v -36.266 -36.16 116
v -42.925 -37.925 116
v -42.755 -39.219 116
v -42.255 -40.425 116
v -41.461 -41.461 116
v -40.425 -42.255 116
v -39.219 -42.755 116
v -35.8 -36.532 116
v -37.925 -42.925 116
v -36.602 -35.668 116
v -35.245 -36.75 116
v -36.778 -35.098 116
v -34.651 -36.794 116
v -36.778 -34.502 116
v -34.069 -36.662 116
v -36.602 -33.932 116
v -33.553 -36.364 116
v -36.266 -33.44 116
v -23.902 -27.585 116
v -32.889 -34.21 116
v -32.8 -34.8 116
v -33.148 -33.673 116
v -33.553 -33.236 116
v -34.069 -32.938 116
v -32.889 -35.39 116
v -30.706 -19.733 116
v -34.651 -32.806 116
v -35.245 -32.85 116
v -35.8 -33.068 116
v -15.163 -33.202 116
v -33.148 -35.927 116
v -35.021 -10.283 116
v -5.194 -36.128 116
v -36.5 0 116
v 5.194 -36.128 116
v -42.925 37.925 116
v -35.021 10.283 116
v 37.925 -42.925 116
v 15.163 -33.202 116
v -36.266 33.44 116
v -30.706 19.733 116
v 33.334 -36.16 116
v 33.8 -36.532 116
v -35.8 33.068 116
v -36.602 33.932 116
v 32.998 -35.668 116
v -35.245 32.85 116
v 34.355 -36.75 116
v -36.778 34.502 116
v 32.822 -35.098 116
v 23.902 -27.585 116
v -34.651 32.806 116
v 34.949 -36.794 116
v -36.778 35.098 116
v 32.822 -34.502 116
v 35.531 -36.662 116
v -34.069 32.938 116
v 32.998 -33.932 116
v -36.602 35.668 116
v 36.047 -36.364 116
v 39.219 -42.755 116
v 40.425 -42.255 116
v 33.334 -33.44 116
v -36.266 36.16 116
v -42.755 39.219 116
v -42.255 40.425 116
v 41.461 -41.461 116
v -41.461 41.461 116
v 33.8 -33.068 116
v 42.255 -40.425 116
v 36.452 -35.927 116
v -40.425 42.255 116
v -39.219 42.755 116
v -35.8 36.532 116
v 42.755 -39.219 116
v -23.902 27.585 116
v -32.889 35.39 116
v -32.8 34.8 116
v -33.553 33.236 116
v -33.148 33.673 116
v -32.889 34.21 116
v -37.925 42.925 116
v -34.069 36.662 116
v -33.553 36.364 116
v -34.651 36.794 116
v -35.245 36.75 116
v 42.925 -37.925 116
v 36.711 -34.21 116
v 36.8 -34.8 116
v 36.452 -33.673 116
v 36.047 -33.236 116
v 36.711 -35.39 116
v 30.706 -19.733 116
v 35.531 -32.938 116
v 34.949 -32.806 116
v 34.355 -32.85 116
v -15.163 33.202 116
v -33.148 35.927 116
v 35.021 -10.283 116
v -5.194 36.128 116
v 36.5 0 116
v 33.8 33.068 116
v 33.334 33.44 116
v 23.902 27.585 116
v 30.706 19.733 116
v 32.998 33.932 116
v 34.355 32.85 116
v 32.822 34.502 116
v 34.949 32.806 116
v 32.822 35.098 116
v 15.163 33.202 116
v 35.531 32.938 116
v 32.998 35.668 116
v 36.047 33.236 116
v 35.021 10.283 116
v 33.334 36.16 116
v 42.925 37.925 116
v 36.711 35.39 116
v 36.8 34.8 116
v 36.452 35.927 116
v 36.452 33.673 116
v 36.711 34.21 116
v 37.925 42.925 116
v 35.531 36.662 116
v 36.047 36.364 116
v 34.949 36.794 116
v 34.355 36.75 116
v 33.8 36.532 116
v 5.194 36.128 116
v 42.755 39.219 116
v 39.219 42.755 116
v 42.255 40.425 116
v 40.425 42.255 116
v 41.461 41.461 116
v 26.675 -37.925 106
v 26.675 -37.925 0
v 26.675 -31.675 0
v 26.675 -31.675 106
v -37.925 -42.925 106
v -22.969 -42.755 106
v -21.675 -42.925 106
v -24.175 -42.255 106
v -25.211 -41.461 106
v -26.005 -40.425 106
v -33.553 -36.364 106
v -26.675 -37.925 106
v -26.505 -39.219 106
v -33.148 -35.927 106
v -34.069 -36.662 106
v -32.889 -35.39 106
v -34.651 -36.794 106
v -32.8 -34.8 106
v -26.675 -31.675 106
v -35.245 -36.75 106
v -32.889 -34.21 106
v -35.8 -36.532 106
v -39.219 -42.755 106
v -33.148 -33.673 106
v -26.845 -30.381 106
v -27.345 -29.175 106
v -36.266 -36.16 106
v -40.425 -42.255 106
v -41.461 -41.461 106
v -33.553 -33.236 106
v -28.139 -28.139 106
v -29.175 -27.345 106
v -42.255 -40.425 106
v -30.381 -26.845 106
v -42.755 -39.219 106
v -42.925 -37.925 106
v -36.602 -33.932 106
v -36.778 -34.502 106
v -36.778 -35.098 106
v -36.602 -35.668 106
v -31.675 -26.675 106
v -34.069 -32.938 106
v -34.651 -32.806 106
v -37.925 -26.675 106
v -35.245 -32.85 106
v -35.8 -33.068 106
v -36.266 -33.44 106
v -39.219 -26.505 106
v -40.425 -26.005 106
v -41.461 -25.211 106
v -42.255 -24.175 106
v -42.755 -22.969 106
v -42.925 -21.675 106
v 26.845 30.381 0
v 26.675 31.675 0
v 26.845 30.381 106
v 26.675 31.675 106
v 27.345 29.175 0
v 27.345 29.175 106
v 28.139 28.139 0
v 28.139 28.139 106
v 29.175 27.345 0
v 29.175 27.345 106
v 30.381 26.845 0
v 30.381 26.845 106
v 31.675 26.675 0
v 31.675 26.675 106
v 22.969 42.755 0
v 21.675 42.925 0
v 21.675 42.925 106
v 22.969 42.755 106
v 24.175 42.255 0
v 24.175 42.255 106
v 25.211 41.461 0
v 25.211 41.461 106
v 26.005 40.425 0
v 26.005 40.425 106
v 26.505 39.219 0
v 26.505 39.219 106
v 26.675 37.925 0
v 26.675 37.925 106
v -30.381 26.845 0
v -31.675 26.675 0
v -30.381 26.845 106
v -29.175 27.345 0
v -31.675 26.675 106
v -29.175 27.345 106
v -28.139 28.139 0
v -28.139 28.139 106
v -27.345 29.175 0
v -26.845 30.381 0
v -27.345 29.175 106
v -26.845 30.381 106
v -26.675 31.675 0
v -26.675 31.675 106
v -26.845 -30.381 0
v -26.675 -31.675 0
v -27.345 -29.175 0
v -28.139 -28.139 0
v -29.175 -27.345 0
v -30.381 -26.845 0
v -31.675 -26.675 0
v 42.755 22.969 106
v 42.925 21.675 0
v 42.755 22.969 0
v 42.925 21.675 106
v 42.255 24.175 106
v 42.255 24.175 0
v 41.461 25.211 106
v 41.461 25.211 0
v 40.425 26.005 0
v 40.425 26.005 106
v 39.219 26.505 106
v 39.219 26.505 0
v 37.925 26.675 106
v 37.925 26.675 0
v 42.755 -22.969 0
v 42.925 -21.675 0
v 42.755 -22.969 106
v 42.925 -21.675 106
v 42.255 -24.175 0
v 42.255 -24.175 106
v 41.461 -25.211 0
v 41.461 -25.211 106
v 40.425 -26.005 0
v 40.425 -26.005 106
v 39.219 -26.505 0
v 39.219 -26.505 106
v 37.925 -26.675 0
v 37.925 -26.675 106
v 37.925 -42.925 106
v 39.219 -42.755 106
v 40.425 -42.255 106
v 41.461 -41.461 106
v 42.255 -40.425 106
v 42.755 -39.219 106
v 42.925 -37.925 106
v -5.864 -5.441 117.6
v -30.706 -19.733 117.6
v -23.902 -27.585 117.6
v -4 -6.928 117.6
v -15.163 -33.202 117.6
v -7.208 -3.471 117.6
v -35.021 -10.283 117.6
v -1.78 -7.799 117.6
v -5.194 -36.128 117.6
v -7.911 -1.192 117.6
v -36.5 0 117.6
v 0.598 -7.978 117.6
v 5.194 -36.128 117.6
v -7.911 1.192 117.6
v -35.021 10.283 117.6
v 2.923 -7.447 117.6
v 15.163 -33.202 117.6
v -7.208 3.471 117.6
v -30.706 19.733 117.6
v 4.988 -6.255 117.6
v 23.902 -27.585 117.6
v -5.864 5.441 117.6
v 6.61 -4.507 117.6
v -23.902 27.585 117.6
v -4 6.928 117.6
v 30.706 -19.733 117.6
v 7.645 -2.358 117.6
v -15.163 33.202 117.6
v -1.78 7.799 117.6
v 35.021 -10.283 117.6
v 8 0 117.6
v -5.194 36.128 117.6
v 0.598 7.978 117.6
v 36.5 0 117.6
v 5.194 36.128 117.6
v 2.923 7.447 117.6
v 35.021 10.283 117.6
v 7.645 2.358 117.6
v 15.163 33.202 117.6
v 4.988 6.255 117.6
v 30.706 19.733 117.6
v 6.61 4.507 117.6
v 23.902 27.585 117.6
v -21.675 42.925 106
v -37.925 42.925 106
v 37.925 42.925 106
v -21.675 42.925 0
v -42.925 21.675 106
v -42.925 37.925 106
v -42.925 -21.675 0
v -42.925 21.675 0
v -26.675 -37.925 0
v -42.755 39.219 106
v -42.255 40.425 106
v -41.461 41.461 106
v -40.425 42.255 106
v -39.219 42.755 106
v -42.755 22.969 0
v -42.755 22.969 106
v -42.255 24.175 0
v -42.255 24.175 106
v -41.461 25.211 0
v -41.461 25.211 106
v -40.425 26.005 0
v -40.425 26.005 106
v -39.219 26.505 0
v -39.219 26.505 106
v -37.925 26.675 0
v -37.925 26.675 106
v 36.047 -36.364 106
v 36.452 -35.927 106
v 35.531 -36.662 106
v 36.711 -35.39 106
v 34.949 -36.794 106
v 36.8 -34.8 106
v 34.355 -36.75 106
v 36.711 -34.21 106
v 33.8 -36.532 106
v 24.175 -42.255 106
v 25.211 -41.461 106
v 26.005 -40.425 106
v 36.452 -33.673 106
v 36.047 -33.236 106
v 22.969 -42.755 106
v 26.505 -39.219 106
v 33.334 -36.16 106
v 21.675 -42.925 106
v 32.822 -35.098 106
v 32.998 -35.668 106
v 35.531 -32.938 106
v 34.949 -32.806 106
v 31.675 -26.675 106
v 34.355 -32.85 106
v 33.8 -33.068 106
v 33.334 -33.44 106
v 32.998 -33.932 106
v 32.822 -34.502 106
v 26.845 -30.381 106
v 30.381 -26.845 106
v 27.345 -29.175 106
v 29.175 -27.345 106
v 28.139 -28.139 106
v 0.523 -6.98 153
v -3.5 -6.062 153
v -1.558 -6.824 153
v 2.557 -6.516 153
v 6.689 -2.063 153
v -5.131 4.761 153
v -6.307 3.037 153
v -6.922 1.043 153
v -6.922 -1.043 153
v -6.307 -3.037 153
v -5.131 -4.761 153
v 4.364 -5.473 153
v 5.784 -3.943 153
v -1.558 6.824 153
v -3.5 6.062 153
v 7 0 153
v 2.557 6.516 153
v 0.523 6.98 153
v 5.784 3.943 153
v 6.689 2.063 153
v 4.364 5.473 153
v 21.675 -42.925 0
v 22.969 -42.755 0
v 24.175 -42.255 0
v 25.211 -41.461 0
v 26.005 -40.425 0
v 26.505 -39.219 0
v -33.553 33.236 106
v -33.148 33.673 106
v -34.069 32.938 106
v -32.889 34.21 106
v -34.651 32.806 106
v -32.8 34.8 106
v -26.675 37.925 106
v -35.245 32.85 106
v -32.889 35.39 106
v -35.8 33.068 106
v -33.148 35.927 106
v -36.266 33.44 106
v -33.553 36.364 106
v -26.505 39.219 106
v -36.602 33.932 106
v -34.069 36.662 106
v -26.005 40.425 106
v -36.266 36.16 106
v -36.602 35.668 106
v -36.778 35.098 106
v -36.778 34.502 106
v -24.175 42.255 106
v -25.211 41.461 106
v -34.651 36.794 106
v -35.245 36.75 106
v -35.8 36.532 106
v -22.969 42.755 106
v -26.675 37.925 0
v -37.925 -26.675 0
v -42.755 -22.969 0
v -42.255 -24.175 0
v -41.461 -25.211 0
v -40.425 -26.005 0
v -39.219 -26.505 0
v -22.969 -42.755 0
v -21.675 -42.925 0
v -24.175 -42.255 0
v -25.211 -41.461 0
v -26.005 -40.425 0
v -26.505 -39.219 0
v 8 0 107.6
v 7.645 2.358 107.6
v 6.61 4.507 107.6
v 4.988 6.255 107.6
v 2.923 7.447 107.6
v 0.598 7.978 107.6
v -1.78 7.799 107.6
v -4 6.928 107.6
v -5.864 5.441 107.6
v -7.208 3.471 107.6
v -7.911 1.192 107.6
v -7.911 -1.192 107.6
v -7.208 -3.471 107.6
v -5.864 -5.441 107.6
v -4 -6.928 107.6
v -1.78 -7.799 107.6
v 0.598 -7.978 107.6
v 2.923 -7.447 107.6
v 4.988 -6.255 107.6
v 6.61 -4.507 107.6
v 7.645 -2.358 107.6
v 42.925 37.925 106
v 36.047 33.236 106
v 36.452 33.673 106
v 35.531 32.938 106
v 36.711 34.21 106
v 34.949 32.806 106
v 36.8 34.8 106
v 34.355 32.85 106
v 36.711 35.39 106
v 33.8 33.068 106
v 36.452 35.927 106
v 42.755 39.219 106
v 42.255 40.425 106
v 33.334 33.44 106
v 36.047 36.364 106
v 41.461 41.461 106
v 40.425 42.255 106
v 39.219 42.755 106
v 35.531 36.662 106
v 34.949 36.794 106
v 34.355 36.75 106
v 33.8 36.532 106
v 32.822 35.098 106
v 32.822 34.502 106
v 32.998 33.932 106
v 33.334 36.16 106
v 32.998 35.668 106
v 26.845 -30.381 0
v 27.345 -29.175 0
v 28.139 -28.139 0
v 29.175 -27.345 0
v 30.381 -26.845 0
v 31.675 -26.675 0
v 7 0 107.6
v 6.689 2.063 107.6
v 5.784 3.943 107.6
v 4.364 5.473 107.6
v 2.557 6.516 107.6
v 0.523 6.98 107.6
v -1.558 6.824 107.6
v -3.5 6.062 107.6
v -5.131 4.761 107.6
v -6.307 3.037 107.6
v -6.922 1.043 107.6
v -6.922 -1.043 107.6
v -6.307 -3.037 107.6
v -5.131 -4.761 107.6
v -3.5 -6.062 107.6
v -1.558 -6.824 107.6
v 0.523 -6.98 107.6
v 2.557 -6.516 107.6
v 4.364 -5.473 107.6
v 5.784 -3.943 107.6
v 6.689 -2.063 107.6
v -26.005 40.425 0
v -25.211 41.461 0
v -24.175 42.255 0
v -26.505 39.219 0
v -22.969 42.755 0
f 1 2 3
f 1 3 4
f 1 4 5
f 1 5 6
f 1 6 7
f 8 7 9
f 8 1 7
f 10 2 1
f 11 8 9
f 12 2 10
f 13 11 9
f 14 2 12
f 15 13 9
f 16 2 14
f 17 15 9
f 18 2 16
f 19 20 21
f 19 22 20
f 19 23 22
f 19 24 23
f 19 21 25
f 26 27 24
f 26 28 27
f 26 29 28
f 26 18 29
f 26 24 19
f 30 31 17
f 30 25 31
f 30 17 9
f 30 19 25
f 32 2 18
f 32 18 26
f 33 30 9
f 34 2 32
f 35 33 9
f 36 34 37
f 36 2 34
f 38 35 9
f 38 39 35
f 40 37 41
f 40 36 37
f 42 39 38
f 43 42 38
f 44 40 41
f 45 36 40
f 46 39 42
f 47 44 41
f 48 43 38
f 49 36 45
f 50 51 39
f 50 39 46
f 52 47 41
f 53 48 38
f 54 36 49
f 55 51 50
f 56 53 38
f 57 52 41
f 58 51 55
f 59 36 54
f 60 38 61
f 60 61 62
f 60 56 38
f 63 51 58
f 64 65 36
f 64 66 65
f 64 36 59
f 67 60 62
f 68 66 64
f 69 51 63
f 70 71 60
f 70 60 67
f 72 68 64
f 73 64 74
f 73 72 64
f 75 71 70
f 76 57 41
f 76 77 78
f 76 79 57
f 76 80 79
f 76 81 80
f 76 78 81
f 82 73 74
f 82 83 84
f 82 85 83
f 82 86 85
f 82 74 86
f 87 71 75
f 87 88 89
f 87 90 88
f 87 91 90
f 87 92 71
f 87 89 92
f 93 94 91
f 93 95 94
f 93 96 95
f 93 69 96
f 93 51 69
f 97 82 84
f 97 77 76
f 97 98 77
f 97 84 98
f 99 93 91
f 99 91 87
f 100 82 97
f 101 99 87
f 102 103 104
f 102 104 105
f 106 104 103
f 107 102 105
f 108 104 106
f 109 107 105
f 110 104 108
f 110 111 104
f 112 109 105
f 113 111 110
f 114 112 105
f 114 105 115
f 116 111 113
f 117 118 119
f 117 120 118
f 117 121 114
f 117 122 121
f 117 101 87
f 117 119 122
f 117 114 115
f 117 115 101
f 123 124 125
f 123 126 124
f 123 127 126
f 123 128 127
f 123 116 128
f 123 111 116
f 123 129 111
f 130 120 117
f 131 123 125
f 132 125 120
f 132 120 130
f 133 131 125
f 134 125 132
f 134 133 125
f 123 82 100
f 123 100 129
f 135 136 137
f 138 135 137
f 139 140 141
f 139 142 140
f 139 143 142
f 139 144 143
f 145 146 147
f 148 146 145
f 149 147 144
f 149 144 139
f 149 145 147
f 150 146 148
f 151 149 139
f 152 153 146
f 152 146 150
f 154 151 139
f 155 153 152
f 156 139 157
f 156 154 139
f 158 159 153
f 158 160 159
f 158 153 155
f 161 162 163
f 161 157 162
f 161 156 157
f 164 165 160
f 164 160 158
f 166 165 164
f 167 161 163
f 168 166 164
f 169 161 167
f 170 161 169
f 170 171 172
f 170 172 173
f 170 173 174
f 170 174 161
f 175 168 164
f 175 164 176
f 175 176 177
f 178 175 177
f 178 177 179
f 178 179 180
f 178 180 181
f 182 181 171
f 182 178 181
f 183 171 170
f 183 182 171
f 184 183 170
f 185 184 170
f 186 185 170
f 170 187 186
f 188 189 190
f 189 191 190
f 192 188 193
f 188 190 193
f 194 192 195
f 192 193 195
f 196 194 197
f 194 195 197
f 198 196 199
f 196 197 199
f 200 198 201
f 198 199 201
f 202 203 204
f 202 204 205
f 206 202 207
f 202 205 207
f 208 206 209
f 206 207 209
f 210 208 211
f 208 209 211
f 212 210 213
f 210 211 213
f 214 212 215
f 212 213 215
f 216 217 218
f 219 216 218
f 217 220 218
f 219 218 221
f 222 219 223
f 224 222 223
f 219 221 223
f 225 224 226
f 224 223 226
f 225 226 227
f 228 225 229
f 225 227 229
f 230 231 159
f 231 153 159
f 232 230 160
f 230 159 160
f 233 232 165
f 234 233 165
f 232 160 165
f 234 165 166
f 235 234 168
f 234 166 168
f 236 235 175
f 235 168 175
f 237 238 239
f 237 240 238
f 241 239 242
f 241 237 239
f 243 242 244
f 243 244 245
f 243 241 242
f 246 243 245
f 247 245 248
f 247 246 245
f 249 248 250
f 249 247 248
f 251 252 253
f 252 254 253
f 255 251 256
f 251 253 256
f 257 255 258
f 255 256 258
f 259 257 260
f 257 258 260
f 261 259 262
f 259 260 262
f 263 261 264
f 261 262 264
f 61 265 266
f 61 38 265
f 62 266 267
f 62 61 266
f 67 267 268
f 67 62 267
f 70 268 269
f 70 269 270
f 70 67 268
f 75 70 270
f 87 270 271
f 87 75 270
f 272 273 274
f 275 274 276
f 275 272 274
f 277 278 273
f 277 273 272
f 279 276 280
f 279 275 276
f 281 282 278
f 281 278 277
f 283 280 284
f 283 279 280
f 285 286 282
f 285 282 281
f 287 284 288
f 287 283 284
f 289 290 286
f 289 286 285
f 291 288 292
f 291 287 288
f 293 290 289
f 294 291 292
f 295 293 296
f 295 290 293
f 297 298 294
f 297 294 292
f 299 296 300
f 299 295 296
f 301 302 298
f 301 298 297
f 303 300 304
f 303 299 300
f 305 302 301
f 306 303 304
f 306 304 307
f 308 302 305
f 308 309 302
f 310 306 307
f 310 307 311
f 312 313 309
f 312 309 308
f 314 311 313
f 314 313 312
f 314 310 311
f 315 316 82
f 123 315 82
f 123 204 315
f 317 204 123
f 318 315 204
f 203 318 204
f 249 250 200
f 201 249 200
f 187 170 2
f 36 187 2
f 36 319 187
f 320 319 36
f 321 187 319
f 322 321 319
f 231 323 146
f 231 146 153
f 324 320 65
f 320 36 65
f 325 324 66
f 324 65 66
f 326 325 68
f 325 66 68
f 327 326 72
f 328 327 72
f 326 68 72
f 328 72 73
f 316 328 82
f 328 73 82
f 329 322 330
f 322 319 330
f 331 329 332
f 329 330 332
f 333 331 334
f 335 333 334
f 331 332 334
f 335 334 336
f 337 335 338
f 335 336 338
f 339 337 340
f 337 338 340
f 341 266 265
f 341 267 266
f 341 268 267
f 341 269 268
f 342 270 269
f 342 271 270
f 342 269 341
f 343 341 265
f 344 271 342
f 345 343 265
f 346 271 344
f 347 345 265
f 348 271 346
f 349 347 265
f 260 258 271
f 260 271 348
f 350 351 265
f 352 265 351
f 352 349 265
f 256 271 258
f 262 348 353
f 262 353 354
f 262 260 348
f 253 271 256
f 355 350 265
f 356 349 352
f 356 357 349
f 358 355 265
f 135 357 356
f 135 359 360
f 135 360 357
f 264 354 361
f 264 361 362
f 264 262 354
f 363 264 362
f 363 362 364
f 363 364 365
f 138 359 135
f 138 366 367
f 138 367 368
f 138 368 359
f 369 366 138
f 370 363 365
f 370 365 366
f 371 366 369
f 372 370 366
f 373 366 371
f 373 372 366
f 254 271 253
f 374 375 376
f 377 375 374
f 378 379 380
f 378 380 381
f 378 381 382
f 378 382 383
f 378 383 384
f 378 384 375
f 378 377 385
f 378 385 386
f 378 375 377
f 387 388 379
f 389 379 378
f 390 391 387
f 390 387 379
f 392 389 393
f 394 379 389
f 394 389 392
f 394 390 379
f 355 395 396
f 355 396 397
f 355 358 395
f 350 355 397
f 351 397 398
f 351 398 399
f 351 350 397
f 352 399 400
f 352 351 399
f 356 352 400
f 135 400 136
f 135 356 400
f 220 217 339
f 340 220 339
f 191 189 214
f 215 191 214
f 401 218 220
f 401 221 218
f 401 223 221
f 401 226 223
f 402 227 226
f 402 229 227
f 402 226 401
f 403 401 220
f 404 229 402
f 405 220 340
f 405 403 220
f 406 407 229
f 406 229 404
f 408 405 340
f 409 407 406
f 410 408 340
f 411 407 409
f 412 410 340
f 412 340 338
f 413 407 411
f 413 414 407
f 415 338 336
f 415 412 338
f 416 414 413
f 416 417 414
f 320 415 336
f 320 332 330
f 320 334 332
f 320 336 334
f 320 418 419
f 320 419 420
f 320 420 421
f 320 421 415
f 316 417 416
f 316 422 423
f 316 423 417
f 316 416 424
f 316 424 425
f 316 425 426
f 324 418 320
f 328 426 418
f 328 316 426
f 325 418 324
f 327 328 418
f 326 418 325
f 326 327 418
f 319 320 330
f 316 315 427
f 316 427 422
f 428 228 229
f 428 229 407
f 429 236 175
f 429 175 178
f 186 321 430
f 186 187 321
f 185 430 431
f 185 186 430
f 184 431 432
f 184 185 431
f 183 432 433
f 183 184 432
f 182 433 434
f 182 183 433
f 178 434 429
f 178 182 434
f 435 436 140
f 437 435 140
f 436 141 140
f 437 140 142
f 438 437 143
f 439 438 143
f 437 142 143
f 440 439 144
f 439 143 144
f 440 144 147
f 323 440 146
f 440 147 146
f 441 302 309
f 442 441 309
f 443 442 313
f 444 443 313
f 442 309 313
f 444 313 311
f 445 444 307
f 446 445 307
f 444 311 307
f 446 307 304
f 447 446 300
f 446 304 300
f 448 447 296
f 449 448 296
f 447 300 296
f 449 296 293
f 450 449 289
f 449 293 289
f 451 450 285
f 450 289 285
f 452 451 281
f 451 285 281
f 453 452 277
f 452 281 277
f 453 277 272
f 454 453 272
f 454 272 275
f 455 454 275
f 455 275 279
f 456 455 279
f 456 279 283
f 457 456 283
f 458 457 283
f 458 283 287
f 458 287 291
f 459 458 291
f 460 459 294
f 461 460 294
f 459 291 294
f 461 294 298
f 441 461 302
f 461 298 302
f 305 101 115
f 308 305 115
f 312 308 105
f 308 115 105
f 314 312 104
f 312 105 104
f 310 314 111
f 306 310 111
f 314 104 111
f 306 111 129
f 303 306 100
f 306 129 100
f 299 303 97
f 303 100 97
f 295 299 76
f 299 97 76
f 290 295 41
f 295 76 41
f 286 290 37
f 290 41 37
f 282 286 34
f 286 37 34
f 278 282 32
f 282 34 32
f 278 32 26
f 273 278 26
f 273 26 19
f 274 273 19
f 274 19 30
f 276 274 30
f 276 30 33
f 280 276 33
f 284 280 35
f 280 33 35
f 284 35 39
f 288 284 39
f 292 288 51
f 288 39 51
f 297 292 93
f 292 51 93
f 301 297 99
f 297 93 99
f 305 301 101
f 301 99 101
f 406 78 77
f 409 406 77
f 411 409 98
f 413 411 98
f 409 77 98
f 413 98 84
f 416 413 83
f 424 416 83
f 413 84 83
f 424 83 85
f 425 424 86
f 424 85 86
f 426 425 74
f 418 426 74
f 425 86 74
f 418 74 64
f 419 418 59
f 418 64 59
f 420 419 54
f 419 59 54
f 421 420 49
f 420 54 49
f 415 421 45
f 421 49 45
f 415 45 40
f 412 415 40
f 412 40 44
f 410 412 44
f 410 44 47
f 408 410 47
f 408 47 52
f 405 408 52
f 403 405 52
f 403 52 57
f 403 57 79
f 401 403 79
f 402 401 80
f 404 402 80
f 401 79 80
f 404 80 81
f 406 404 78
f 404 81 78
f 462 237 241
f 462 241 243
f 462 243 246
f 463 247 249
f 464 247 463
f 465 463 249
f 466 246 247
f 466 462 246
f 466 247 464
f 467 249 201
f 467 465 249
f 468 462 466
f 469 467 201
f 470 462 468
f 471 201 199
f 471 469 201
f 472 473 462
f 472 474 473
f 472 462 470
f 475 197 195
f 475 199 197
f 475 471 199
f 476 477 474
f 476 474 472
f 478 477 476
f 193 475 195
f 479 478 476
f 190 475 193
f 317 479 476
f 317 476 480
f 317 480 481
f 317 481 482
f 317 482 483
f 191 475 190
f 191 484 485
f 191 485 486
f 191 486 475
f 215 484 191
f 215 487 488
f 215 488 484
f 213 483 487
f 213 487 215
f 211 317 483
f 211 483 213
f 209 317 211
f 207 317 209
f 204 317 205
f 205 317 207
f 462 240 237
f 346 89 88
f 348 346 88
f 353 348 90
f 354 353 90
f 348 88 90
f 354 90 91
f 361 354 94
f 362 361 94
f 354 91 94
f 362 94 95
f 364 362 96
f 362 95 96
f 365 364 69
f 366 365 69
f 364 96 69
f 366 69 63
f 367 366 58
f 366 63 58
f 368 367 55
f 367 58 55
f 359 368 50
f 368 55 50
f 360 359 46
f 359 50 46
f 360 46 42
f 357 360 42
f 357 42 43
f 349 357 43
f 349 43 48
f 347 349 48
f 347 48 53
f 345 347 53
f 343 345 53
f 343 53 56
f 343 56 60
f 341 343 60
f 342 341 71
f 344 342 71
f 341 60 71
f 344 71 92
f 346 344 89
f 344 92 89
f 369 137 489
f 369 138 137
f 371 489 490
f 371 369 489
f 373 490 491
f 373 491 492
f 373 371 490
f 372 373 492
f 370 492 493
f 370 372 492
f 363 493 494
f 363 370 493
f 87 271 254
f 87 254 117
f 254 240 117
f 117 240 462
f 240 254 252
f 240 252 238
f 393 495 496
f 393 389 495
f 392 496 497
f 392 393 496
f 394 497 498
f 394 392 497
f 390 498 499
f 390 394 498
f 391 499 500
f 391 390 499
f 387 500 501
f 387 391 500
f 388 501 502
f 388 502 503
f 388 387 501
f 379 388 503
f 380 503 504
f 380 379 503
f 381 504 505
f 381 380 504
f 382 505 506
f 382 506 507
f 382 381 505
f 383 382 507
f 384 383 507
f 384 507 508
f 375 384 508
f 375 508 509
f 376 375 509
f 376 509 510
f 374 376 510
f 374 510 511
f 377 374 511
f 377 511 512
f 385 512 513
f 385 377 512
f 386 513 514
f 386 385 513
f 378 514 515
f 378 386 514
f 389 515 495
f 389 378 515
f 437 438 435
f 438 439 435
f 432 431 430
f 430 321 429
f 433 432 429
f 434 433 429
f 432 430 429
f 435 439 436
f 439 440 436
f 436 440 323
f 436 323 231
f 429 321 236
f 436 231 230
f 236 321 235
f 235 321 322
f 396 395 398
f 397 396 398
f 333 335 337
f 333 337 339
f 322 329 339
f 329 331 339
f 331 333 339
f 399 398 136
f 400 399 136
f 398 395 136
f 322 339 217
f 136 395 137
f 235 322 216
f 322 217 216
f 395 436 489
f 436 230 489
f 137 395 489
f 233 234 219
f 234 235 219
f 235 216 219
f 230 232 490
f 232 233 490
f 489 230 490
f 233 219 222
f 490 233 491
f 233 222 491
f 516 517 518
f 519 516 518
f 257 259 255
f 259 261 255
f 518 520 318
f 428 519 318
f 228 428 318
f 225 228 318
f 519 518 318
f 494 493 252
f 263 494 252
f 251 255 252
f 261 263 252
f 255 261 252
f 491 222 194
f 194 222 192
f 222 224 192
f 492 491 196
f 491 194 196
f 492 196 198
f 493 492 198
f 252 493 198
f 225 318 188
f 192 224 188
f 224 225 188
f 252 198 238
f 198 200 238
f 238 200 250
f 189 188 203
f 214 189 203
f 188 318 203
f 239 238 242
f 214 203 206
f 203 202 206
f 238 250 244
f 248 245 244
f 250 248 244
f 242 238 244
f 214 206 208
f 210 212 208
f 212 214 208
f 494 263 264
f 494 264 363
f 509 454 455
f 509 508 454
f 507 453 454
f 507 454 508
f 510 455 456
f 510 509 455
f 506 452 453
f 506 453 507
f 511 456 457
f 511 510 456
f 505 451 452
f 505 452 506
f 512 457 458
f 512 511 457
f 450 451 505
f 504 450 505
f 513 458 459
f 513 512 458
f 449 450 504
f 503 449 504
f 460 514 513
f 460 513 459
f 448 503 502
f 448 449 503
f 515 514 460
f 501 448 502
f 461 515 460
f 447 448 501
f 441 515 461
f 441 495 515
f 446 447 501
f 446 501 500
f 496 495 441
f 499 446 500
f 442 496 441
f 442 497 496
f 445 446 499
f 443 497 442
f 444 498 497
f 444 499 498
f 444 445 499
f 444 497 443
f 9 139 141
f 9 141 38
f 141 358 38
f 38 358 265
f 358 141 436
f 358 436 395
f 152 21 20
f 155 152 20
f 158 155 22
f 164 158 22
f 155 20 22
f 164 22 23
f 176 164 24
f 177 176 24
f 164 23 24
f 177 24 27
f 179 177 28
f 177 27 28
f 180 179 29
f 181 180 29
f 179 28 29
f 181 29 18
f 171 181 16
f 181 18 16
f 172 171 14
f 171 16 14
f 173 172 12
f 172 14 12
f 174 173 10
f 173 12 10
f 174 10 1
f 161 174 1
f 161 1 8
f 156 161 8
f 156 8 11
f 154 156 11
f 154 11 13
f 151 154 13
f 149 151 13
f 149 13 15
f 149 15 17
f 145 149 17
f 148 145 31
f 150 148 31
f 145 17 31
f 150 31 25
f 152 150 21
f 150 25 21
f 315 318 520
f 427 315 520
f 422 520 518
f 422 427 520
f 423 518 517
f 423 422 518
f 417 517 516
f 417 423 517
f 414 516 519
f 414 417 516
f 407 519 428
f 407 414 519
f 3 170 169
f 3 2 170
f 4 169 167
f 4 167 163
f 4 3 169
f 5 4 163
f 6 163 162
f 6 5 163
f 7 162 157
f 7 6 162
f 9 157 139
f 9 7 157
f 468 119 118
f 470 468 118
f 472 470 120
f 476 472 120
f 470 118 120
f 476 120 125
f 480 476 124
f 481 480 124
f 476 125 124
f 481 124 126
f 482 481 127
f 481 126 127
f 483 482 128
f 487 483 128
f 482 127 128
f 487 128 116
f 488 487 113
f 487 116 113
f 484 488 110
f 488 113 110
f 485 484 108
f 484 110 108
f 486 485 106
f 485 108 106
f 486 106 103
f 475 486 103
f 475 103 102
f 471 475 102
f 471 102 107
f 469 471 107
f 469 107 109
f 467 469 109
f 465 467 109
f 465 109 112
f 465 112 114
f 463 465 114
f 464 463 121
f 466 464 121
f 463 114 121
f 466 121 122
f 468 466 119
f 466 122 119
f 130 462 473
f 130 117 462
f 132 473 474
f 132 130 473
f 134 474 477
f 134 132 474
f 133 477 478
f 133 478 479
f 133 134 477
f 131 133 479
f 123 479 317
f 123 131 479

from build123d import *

# Parameters (mm, degrees)
SZKIC1_W                    = 85.85
SZKIC1_H                    = 85.85
DODANIE_WYCI_GNI_CIE2_DEPTH = 116
SZKIC3_R                    = 36.5
DODANIE_WYCI_GNI_CIE3_DEPTH = 1.6
SZKIC5_W                    = 16.25
SZKIC5_H                    = 16.25
WYTNIJ_WYCI_GNI_CIE1_DEPTH  = 106
SZYK_LINIOWY1_COUNT         = 2
SZYK_LINIOWY1_PITCH         = 69.6
SZYK_LINIOWY1_COUNT_DIR2    = 2
SZYK_LINIOWY1_PITCH_DIR2    = 69.6
SZKIC6_R                    = 2
WYTNIJ_WYCI_GNI_CIE2_DEPTH  = 10
SZYK_LINIOWY2_COUNT         = 2
SZYK_LINIOWY2_PITCH         = 69.6
SZYK_LINIOWY2_COUNT_DIR2    = 2
SZYK_LINIOWY2_PITCH_DIR2    = 69.6
SZKIC7_R                    = 7
DODANIE_WYCI_GNI_CIE4_DEPTH = 35.4
SZKIC8_R                    = 8
SZKIC8_R_2                  = 7
WYTNIJ_WYCI_GNI_CIE5_DEPTH  = 10
ZAOKR_GLENIE1_R             = 5
ZAOKR_GLENIE2_R             = 5
ZAOKR_GLENIE3_R             = 5


with BuildPart() as part:
    # Szkic1 → Dodanie-wyciągnięcie2 (new body)
    with BuildSketch(Plane.XY):
        Rectangle(SZKIC1_W, SZKIC1_H)
    extrude(amount=DODANIE_WYCI_GNI_CIE2_DEPTH)

    # Szkic3 → Dodanie-wyciągnięcie3 (add)
    with BuildSketch(Plane.XY.offset(116)):
        Circle(SZKIC3_R)
    extrude(amount=DODANIE_WYCI_GNI_CIE3_DEPTH)

    # Szkic5 → Wytnij-wyciągnięcie1 (cut)
    with BuildSketch(Plane(origin=(0, 0, 0), x_dir=(-1, 0, 0), z_dir=(0, 0, -1))):
        with Locations((-34.8, 34.8)):
            Rectangle(SZKIC5_W, SZKIC5_H)
    wytnij_wyci_gni_cie1 = extrude(amount=-WYTNIJ_WYCI_GNI_CIE1_DEPTH, mode=Mode.SUBTRACT)

    # Szyk liniowy1: Wytnij-wyci_gni_cie1 2 × 2
    with Locations(*[(-i * SZYK_LINIOWY1_PITCH, -j * SZYK_LINIOWY1_PITCH_DIR2, 0) for i in range(SZYK_LINIOWY1_COUNT) for j in range(SZYK_LINIOWY1_COUNT_DIR2) if (i, j) != (0, 0)]):
        add(wytnij_wyci_gni_cie1, mode=Mode.SUBTRACT)

    # Szkic6 → Wytnij-wyciągnięcie2 (cut)
    with BuildSketch(Plane.XY.offset(116)):
        with Locations((-34.8, 34.8)):
            Circle(SZKIC6_R)
    wytnij_wyci_gni_cie2 = extrude(amount=-WYTNIJ_WYCI_GNI_CIE2_DEPTH, mode=Mode.SUBTRACT)

    # Szyk liniowy2: Wytnij-wyci_gni_cie2 2 × 2
    with Locations(*[(i * SZYK_LINIOWY2_PITCH, -j * SZYK_LINIOWY2_PITCH_DIR2, 0) for i in range(SZYK_LINIOWY2_COUNT) for j in range(SZYK_LINIOWY2_COUNT_DIR2) if (i, j) != (0, 0)]):
        add(wytnij_wyci_gni_cie2, mode=Mode.SUBTRACT)

    # Szkic7 → Dodanie-wyciągnięcie4 (add)
    with BuildSketch(Plane.XY.offset(117.6)):
        Circle(SZKIC7_R)
    extrude(amount=DODANIE_WYCI_GNI_CIE4_DEPTH)

    # Szkic8 → Wytnij-wyciągnięcie5 (cut)
    with BuildSketch(Plane.XY.offset(117.6)):
        Circle(SZKIC8_R)
        Circle(SZKIC8_R_2, mode=Mode.SUBTRACT)
    extrude(amount=-WYTNIJ_WYCI_GNI_CIE5_DEPTH, mode=Mode.SUBTRACT)

    # Zaokrąglenie1
    zaokr_glenie1_edges = [part.edges().sort_by_distance(p)[0] for p in [
        (42.925, -42.925, 111),
        (-42.925, -42.925, 111),
        (-42.925, 42.925, 111),
        (42.925, 42.925, 111),
    ]]
    fillet(zaokr_glenie1_edges, radius=ZAOKR_GLENIE1_R)

    # Zaokrąglenie2
    zaokr_glenie2_edges = [part.edges().sort_by_distance(p)[0] for p in [
        (42.925, 26.675, 53),
        (26.675, 42.925, 53),
        (42.925, -26.675, 53),
        (26.675, -42.925, 53),
        (-26.675, 42.925, 53),
        (-42.925, 26.675, 53),
        (-26.675, -42.925, 53),
        (-42.925, -26.675, 53),
    ]]
    fillet(zaokr_glenie2_edges, radius=ZAOKR_GLENIE2_R)

    # Zaokrąglenie3
    zaokr_glenie3_edges = [part.edges().sort_by_distance(p)[0] for p in [
        (26.675, 26.675, 53),
        (26.675, -26.675, 53),
        (-26.675, 26.675, 53),
        (-26.675, -26.675, 53),
    ]]
    fillet(zaokr_glenie3_edges, radius=ZAOKR_GLENIE3_R)


solid = part.part
